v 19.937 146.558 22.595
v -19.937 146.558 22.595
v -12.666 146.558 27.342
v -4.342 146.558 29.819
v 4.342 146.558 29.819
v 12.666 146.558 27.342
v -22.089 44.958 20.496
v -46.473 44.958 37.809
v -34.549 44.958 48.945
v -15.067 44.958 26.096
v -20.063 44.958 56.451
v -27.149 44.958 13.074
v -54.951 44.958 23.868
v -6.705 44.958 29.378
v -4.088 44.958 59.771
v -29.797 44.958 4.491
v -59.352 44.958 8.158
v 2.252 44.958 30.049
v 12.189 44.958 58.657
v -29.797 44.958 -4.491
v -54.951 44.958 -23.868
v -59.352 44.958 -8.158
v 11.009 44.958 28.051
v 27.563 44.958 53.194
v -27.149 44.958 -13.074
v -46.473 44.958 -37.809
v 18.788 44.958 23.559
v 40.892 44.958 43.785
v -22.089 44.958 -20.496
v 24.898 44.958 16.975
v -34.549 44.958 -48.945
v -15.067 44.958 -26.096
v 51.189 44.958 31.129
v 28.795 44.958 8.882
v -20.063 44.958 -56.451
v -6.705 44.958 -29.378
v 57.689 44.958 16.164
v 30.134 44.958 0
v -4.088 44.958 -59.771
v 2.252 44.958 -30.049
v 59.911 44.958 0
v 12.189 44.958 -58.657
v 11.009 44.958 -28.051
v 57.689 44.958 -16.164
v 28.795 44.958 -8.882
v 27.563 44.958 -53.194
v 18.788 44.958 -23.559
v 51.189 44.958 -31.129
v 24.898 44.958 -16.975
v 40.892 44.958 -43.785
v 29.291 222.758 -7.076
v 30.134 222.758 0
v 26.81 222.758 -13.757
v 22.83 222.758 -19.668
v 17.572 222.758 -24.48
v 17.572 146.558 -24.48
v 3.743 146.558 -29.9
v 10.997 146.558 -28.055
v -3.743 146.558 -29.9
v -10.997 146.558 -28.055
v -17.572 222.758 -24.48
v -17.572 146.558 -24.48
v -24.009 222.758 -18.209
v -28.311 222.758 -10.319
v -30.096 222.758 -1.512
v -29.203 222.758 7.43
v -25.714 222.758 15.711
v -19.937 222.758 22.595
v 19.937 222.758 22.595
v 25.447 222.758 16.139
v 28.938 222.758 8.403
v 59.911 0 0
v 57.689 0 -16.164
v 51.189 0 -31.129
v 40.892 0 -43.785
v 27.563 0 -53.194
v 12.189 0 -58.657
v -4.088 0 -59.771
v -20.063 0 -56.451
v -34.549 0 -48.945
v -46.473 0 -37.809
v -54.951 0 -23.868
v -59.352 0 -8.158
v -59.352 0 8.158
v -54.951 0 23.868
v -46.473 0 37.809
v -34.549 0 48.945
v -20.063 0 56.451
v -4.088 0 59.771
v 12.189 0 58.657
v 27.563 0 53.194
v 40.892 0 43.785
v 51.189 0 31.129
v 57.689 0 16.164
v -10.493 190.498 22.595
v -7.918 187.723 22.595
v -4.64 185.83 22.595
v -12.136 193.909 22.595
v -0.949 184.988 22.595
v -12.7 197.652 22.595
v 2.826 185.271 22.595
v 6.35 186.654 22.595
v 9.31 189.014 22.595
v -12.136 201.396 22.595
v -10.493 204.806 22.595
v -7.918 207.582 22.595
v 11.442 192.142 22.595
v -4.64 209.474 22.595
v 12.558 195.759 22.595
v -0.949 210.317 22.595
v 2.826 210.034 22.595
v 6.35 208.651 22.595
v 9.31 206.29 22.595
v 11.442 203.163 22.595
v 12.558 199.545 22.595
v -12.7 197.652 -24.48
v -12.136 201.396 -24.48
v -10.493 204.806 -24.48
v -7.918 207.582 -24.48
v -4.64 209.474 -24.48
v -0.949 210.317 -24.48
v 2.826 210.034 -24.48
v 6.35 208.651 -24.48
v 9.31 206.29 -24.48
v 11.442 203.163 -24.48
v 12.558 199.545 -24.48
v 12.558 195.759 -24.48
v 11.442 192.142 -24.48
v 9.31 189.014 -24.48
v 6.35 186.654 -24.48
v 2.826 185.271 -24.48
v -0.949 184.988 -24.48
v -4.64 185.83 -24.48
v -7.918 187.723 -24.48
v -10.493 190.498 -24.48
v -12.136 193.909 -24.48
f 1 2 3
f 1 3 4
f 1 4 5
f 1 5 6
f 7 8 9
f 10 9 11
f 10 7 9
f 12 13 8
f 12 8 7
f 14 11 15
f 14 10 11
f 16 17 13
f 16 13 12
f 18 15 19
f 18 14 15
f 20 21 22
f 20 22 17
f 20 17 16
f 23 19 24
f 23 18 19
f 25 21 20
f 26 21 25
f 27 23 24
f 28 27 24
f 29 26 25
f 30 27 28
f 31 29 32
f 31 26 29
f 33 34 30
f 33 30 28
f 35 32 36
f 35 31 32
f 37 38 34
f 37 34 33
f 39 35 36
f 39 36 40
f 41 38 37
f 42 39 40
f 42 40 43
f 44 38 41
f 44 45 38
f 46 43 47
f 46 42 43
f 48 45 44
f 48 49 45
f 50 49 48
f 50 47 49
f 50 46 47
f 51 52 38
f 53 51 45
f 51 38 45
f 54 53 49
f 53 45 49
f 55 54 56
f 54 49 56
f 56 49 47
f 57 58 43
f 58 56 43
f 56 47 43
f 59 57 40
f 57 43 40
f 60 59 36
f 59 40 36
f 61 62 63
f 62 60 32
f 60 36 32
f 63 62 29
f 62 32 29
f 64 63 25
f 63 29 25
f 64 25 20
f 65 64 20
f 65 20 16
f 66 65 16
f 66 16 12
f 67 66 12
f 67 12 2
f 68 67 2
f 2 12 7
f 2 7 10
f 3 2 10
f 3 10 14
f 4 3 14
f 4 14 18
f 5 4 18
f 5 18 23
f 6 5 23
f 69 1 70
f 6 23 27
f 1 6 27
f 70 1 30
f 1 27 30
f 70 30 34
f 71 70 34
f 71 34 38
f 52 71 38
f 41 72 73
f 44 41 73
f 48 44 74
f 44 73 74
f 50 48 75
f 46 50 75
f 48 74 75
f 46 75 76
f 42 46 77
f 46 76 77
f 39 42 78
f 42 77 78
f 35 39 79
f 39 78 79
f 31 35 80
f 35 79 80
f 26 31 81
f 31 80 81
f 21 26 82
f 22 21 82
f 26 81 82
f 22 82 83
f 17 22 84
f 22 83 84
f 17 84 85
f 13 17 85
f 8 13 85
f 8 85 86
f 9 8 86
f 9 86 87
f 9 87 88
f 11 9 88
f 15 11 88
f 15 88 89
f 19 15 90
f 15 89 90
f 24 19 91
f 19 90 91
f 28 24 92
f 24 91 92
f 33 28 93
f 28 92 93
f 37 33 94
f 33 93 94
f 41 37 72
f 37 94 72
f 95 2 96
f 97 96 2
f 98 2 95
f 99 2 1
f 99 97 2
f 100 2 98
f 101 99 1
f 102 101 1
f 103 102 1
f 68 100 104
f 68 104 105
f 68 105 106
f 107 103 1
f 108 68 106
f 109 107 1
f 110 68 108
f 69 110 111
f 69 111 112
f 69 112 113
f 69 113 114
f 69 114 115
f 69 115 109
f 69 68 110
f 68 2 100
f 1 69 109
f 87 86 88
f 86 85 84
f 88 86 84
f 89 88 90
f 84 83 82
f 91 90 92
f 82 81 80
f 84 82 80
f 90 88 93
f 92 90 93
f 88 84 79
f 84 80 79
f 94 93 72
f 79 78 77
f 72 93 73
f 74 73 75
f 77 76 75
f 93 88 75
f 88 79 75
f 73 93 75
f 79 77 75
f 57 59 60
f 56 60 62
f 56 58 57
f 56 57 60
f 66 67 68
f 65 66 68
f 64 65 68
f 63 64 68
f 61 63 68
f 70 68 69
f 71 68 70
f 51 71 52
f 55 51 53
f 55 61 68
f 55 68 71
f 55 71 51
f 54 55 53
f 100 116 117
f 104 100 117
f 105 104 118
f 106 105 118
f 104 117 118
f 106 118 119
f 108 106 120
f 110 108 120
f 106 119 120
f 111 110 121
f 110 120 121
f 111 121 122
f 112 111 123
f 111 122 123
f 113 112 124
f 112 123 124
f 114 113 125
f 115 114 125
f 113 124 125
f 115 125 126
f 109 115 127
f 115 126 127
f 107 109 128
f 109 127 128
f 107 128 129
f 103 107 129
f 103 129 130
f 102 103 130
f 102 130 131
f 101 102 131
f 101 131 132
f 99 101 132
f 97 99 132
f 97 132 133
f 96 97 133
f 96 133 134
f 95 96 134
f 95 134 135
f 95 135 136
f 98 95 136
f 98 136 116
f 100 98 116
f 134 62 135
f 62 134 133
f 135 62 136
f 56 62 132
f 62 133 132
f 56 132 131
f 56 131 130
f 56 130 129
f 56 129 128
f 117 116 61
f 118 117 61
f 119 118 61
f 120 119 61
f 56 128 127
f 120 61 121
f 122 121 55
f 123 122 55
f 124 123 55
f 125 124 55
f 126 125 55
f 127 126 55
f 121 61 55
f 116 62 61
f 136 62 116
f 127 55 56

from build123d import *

# Parameters (mm, degrees)
SKETCH1_R           = 59.910502434
BOSS_EXTRUDE1_DEPTH = 44.958
SKETCH2_R           = 30.133554255
BOSS_EXTRUDE2_DEPTH = 177.8
SKETCH3_W           = 54.540648196
SKETCH3_H           = 11.308105597
SKETCH3_H_2         = 15.077164852
CUT_EXTRUDE4_DEPTH  = 76.2
SKETCH5_R           = 12.7
CUT_EXTRUDE5_DEPTH  = 85.390003891


with BuildPart() as part:
    # Sketch1 → Boss-Extrude1 (new body)
    with BuildSketch(Plane(origin=(0, 0, 0), x_dir=(1, 0, 0), z_dir=(0, 1, 0))):
        Circle(SKETCH1_R)
    extrude(amount=BOSS_EXTRUDE1_DEPTH)

    # Sketch2 → Boss-Extrude2 (add)
    with BuildSketch(Plane(origin=(0, 44.958, 0), x_dir=(1, 0, 0), z_dir=(0, 1, 0))):
        Circle(SKETCH2_R)
    extrude(amount=BOSS_EXTRUDE2_DEPTH)

    # Sketch3 → Cut-Extrude4 (cut)
    with BuildSketch(Plane(origin=(0, 222.758, 0), x_dir=(1, 0, 0), z_dir=(0, 1, 0))):
        with Locations((0, 30.133554255)):
            Rectangle(SKETCH3_W, SKETCH3_H)
        with Locations((0, -30.133554255)):
            Rectangle(SKETCH3_W, SKETCH3_H_2)
    extrude(amount=-CUT_EXTRUDE4_DEPTH, mode=Mode.SUBTRACT)

    # Sketch5 → Cut-Extrude5 (cut, through all)
    with BuildSketch(Plane(origin=(0, 0, -24.479501456), x_dir=(-1, 0, 0), z_dir=(0, 0, -1))):
        with Locations((0, 197.652270739)):
            Circle(SKETCH5_R)
    extrude(amount=-CUT_EXTRUDE5_DEPTH, mode=Mode.SUBTRACT)


solid = part.part
